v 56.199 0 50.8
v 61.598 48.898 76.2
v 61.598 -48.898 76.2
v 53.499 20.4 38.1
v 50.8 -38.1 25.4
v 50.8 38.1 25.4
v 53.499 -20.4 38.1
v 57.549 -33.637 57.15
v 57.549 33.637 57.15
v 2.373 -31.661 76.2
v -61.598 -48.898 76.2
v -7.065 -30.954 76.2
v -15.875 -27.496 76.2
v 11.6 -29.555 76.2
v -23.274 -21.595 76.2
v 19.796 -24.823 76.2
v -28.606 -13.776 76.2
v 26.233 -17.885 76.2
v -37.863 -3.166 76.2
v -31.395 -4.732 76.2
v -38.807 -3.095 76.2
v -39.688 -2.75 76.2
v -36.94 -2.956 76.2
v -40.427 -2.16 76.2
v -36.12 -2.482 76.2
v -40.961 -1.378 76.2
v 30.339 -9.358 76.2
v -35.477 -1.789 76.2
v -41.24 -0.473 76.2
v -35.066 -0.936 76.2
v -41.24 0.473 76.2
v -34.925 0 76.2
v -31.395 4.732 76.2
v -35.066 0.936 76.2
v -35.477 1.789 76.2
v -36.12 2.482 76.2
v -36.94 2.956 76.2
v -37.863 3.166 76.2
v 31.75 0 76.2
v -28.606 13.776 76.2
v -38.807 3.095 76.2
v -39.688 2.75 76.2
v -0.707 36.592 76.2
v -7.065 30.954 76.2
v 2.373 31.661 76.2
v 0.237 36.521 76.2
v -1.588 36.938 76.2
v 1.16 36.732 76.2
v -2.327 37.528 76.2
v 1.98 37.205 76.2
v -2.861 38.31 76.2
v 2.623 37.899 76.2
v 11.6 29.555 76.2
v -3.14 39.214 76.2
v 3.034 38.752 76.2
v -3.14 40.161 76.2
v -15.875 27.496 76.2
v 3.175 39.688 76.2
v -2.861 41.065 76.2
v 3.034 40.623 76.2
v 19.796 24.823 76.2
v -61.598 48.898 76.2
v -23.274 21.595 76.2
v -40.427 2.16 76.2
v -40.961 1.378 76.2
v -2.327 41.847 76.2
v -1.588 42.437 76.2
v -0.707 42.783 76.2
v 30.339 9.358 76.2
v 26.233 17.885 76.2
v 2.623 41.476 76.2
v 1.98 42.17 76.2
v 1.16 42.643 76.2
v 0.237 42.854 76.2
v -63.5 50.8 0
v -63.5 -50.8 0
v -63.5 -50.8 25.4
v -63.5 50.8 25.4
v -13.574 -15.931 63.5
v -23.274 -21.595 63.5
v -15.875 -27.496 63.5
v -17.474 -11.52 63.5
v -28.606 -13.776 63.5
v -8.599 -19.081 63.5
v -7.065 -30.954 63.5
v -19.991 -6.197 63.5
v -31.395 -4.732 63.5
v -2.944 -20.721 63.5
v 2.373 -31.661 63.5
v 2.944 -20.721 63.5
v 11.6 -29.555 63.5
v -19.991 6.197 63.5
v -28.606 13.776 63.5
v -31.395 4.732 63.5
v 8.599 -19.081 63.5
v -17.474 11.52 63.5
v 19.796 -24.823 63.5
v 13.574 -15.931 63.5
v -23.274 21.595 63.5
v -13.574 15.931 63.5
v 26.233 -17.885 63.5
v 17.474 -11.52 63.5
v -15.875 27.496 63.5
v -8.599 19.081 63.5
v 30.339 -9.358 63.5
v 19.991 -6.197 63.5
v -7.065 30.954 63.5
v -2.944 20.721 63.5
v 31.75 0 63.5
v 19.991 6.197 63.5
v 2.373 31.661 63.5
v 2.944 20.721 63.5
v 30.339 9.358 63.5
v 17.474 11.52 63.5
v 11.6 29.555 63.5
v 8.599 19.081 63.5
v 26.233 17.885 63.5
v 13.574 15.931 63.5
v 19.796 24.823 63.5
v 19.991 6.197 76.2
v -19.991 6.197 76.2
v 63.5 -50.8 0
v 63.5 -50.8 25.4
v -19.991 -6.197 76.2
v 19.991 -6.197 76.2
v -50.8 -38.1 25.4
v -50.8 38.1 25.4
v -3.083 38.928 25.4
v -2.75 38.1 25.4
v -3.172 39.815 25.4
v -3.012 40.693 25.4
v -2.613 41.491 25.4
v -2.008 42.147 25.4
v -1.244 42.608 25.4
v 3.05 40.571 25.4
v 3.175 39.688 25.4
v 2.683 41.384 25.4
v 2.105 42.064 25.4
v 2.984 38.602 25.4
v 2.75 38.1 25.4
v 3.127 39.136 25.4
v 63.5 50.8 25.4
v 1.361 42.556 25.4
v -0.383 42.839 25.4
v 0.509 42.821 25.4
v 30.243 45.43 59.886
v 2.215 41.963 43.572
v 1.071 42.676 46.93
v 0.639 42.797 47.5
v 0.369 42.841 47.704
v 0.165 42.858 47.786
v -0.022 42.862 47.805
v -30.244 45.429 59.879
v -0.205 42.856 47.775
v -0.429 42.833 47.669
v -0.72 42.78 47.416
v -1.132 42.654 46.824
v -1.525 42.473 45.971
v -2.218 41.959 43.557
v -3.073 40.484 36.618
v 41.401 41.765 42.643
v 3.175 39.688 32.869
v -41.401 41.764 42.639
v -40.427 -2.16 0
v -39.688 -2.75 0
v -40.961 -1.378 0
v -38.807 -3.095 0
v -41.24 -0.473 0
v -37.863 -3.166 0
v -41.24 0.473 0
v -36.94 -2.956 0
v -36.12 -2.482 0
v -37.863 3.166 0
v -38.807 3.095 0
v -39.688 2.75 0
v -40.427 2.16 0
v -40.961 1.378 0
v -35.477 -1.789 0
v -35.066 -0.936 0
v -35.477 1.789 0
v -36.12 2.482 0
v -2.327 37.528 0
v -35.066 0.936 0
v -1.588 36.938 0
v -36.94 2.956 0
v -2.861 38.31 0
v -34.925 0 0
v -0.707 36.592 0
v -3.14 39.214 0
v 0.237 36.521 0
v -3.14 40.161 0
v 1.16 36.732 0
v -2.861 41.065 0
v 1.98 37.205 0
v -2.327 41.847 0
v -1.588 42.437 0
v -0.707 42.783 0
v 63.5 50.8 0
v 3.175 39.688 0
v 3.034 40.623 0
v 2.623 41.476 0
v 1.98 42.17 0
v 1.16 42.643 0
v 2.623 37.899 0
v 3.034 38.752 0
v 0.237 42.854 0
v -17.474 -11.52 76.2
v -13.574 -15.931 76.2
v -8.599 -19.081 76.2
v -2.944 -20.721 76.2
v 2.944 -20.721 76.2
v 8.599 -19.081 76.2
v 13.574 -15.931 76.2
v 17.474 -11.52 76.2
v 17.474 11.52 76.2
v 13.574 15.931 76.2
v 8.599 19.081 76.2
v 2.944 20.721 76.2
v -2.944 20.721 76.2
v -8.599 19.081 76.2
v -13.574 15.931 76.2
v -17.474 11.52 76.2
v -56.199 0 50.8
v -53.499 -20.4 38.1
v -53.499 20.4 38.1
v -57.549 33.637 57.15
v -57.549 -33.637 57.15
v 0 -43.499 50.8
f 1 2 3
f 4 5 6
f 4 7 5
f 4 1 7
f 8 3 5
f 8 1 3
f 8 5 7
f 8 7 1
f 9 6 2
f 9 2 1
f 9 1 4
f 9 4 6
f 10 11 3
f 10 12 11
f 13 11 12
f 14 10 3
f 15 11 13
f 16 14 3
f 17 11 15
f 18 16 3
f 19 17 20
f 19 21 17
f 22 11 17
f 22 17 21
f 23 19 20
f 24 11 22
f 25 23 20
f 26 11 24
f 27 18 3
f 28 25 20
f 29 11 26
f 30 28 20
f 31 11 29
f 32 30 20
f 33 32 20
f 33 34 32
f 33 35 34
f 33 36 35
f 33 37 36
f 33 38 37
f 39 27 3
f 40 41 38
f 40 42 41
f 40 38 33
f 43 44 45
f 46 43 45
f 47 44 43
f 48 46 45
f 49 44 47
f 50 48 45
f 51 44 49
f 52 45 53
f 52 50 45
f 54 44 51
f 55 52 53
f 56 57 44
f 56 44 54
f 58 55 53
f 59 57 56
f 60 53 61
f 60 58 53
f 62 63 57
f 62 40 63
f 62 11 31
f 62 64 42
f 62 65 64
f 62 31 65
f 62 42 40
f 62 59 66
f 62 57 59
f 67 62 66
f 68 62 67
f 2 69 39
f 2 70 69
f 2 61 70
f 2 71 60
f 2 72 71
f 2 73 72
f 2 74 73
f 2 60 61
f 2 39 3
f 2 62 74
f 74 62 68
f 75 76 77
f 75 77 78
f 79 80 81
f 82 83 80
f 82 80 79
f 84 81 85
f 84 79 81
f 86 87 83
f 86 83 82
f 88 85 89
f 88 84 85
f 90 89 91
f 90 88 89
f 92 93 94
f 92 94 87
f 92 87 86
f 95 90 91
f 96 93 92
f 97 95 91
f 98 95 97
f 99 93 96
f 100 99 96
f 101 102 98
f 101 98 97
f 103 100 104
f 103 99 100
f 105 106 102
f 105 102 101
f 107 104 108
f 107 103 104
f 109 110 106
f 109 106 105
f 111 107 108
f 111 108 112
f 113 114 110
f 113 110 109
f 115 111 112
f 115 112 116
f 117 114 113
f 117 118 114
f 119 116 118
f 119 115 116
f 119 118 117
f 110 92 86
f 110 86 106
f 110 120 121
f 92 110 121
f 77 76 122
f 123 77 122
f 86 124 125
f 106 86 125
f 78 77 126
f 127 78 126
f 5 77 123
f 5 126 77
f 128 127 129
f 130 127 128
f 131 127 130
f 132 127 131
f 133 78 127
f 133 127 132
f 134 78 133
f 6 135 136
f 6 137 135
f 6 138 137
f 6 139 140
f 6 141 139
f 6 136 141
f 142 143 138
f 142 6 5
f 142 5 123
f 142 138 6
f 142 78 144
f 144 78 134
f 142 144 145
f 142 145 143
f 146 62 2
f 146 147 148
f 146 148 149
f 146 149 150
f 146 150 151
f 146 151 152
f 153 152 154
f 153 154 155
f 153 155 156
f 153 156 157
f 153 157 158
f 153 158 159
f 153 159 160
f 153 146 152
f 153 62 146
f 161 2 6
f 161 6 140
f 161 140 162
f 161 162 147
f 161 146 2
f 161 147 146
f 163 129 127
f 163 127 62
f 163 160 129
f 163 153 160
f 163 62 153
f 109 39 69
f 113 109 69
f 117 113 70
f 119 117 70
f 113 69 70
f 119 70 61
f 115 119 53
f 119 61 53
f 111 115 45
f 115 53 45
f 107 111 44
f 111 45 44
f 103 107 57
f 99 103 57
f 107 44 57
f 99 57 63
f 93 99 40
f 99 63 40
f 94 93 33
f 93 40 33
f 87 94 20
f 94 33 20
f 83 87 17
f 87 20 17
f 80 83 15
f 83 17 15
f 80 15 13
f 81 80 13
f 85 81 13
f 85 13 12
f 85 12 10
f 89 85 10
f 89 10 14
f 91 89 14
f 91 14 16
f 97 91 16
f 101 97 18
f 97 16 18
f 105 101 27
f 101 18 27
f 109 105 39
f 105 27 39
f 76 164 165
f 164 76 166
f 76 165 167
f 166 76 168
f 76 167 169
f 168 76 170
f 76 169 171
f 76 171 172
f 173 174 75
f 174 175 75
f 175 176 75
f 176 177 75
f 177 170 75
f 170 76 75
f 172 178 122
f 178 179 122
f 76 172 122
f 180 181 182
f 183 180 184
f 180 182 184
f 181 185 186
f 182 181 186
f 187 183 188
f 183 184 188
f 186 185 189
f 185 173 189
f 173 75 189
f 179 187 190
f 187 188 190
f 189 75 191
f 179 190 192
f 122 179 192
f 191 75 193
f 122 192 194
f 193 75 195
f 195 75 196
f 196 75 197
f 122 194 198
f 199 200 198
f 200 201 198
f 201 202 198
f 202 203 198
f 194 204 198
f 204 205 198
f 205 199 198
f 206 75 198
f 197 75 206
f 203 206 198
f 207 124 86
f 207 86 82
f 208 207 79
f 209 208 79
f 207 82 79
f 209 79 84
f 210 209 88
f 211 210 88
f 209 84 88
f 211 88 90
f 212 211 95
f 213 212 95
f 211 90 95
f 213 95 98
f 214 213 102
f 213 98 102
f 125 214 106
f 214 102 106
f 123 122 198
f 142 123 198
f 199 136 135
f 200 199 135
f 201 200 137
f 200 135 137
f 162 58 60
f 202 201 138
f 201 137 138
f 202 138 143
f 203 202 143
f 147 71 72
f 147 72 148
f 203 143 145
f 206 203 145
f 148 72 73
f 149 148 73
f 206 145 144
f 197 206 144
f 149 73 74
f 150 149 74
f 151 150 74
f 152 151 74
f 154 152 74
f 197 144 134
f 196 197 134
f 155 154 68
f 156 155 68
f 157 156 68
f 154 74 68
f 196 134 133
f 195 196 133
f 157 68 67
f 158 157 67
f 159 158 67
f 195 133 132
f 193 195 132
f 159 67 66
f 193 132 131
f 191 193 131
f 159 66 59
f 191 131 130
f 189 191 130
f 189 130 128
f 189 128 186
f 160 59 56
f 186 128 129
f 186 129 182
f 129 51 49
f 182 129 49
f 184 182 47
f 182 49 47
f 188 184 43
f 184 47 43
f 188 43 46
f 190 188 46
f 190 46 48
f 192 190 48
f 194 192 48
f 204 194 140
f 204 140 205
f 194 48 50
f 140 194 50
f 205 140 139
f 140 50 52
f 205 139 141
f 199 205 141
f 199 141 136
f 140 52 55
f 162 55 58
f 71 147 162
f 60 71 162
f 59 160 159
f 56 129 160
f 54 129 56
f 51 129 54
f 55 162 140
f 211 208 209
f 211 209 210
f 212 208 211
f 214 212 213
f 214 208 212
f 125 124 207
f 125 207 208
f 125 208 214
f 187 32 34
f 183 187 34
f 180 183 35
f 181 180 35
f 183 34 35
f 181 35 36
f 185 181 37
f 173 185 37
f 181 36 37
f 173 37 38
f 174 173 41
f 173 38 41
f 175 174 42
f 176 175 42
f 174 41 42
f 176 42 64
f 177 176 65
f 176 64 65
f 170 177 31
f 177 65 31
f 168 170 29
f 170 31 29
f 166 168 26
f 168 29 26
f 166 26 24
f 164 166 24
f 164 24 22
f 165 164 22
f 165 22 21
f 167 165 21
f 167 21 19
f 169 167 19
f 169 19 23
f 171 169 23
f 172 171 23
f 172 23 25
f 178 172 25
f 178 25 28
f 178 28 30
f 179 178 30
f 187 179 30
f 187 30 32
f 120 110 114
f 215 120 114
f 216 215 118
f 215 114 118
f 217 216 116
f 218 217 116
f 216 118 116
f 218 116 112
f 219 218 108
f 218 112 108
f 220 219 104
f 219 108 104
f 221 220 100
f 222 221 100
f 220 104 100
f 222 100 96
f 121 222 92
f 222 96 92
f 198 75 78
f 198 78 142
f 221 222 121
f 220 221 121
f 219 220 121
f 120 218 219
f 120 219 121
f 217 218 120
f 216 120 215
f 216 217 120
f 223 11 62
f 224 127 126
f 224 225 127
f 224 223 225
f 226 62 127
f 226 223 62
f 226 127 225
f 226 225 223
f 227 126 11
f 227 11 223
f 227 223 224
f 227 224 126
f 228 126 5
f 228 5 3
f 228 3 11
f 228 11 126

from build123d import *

# Parameters (mm, degrees)
F0_W      = 127
F0_H      = 101.6
F1_DEPTH  = 25.4
F2_W      = 101.6
F2_H      = 76.2
F3_DEPTH  = 50.8
F3_TAPER  = -12
F4_R      = 31.75
F5_DEPTH  = 12.7
F6_R      = 20.9296
F7_DEPTH  = 12.7
F8_R      = 3.175
F9_DEPTH  = 76.201
F11_DEPTH = 12.7


with BuildPart() as f1:
    # F0 (on Top) → F1 (new body)
    with BuildSketch(Plane.XY):
        Rectangle(F0_W, F0_H)
    extrude(amount=F1_DEPTH)

    # F2 (on face) → F3 (join)
    with BuildSketch(Plane.XY.offset(25.4)):
        Rectangle(F2_W, F2_H)
    extrude(amount=F3_DEPTH, taper=F3_TAPER)

    # F4 (on face) → F5 (cut)
    with BuildSketch(Plane.XY.offset(76.2)):
        Circle(F4_R)
    extrude(amount=-F5_DEPTH, mode=Mode.SUBTRACT)

    # F6 (on face) → F7 (join)
    with BuildSketch(Plane.XY.offset(63.5)):
        Circle(F6_R)
    extrude(amount=F7_DEPTH)

    # F8 (on face) → F9 (cut, through all)
    with BuildSketch(Plane.XY.offset(76.2)):
        with Locations((-38.1, 0)):
            Circle(F8_R)
        with Locations((0, 39.6875)):
            Circle(F8_R)
    extrude(amount=-F9_DEPTH, mode=Mode.SUBTRACT)

    # F10 (on face) → F11 (cut)
    with BuildSketch(Plane.XY.offset(76.2)):
        with BuildLine():
            ThreePointArc((19.991276409, -6.1965332), (20.9296, 0), (19.991276409, 6.1965332))
            Line((19.991276409, 6.1965332), (-19.991276409, 6.1965332))
            ThreePointArc((-19.991276409, 6.1965332), (-20.9296, 0), (-19.991276409, -6.1965332))
            Line((-19.991276409, -6.1965332), (19.991276409, -6.1965332))
        make_face()
    extrude(amount=-F11_DEPTH, mode=Mode.SUBTRACT)


solid = f1.part
